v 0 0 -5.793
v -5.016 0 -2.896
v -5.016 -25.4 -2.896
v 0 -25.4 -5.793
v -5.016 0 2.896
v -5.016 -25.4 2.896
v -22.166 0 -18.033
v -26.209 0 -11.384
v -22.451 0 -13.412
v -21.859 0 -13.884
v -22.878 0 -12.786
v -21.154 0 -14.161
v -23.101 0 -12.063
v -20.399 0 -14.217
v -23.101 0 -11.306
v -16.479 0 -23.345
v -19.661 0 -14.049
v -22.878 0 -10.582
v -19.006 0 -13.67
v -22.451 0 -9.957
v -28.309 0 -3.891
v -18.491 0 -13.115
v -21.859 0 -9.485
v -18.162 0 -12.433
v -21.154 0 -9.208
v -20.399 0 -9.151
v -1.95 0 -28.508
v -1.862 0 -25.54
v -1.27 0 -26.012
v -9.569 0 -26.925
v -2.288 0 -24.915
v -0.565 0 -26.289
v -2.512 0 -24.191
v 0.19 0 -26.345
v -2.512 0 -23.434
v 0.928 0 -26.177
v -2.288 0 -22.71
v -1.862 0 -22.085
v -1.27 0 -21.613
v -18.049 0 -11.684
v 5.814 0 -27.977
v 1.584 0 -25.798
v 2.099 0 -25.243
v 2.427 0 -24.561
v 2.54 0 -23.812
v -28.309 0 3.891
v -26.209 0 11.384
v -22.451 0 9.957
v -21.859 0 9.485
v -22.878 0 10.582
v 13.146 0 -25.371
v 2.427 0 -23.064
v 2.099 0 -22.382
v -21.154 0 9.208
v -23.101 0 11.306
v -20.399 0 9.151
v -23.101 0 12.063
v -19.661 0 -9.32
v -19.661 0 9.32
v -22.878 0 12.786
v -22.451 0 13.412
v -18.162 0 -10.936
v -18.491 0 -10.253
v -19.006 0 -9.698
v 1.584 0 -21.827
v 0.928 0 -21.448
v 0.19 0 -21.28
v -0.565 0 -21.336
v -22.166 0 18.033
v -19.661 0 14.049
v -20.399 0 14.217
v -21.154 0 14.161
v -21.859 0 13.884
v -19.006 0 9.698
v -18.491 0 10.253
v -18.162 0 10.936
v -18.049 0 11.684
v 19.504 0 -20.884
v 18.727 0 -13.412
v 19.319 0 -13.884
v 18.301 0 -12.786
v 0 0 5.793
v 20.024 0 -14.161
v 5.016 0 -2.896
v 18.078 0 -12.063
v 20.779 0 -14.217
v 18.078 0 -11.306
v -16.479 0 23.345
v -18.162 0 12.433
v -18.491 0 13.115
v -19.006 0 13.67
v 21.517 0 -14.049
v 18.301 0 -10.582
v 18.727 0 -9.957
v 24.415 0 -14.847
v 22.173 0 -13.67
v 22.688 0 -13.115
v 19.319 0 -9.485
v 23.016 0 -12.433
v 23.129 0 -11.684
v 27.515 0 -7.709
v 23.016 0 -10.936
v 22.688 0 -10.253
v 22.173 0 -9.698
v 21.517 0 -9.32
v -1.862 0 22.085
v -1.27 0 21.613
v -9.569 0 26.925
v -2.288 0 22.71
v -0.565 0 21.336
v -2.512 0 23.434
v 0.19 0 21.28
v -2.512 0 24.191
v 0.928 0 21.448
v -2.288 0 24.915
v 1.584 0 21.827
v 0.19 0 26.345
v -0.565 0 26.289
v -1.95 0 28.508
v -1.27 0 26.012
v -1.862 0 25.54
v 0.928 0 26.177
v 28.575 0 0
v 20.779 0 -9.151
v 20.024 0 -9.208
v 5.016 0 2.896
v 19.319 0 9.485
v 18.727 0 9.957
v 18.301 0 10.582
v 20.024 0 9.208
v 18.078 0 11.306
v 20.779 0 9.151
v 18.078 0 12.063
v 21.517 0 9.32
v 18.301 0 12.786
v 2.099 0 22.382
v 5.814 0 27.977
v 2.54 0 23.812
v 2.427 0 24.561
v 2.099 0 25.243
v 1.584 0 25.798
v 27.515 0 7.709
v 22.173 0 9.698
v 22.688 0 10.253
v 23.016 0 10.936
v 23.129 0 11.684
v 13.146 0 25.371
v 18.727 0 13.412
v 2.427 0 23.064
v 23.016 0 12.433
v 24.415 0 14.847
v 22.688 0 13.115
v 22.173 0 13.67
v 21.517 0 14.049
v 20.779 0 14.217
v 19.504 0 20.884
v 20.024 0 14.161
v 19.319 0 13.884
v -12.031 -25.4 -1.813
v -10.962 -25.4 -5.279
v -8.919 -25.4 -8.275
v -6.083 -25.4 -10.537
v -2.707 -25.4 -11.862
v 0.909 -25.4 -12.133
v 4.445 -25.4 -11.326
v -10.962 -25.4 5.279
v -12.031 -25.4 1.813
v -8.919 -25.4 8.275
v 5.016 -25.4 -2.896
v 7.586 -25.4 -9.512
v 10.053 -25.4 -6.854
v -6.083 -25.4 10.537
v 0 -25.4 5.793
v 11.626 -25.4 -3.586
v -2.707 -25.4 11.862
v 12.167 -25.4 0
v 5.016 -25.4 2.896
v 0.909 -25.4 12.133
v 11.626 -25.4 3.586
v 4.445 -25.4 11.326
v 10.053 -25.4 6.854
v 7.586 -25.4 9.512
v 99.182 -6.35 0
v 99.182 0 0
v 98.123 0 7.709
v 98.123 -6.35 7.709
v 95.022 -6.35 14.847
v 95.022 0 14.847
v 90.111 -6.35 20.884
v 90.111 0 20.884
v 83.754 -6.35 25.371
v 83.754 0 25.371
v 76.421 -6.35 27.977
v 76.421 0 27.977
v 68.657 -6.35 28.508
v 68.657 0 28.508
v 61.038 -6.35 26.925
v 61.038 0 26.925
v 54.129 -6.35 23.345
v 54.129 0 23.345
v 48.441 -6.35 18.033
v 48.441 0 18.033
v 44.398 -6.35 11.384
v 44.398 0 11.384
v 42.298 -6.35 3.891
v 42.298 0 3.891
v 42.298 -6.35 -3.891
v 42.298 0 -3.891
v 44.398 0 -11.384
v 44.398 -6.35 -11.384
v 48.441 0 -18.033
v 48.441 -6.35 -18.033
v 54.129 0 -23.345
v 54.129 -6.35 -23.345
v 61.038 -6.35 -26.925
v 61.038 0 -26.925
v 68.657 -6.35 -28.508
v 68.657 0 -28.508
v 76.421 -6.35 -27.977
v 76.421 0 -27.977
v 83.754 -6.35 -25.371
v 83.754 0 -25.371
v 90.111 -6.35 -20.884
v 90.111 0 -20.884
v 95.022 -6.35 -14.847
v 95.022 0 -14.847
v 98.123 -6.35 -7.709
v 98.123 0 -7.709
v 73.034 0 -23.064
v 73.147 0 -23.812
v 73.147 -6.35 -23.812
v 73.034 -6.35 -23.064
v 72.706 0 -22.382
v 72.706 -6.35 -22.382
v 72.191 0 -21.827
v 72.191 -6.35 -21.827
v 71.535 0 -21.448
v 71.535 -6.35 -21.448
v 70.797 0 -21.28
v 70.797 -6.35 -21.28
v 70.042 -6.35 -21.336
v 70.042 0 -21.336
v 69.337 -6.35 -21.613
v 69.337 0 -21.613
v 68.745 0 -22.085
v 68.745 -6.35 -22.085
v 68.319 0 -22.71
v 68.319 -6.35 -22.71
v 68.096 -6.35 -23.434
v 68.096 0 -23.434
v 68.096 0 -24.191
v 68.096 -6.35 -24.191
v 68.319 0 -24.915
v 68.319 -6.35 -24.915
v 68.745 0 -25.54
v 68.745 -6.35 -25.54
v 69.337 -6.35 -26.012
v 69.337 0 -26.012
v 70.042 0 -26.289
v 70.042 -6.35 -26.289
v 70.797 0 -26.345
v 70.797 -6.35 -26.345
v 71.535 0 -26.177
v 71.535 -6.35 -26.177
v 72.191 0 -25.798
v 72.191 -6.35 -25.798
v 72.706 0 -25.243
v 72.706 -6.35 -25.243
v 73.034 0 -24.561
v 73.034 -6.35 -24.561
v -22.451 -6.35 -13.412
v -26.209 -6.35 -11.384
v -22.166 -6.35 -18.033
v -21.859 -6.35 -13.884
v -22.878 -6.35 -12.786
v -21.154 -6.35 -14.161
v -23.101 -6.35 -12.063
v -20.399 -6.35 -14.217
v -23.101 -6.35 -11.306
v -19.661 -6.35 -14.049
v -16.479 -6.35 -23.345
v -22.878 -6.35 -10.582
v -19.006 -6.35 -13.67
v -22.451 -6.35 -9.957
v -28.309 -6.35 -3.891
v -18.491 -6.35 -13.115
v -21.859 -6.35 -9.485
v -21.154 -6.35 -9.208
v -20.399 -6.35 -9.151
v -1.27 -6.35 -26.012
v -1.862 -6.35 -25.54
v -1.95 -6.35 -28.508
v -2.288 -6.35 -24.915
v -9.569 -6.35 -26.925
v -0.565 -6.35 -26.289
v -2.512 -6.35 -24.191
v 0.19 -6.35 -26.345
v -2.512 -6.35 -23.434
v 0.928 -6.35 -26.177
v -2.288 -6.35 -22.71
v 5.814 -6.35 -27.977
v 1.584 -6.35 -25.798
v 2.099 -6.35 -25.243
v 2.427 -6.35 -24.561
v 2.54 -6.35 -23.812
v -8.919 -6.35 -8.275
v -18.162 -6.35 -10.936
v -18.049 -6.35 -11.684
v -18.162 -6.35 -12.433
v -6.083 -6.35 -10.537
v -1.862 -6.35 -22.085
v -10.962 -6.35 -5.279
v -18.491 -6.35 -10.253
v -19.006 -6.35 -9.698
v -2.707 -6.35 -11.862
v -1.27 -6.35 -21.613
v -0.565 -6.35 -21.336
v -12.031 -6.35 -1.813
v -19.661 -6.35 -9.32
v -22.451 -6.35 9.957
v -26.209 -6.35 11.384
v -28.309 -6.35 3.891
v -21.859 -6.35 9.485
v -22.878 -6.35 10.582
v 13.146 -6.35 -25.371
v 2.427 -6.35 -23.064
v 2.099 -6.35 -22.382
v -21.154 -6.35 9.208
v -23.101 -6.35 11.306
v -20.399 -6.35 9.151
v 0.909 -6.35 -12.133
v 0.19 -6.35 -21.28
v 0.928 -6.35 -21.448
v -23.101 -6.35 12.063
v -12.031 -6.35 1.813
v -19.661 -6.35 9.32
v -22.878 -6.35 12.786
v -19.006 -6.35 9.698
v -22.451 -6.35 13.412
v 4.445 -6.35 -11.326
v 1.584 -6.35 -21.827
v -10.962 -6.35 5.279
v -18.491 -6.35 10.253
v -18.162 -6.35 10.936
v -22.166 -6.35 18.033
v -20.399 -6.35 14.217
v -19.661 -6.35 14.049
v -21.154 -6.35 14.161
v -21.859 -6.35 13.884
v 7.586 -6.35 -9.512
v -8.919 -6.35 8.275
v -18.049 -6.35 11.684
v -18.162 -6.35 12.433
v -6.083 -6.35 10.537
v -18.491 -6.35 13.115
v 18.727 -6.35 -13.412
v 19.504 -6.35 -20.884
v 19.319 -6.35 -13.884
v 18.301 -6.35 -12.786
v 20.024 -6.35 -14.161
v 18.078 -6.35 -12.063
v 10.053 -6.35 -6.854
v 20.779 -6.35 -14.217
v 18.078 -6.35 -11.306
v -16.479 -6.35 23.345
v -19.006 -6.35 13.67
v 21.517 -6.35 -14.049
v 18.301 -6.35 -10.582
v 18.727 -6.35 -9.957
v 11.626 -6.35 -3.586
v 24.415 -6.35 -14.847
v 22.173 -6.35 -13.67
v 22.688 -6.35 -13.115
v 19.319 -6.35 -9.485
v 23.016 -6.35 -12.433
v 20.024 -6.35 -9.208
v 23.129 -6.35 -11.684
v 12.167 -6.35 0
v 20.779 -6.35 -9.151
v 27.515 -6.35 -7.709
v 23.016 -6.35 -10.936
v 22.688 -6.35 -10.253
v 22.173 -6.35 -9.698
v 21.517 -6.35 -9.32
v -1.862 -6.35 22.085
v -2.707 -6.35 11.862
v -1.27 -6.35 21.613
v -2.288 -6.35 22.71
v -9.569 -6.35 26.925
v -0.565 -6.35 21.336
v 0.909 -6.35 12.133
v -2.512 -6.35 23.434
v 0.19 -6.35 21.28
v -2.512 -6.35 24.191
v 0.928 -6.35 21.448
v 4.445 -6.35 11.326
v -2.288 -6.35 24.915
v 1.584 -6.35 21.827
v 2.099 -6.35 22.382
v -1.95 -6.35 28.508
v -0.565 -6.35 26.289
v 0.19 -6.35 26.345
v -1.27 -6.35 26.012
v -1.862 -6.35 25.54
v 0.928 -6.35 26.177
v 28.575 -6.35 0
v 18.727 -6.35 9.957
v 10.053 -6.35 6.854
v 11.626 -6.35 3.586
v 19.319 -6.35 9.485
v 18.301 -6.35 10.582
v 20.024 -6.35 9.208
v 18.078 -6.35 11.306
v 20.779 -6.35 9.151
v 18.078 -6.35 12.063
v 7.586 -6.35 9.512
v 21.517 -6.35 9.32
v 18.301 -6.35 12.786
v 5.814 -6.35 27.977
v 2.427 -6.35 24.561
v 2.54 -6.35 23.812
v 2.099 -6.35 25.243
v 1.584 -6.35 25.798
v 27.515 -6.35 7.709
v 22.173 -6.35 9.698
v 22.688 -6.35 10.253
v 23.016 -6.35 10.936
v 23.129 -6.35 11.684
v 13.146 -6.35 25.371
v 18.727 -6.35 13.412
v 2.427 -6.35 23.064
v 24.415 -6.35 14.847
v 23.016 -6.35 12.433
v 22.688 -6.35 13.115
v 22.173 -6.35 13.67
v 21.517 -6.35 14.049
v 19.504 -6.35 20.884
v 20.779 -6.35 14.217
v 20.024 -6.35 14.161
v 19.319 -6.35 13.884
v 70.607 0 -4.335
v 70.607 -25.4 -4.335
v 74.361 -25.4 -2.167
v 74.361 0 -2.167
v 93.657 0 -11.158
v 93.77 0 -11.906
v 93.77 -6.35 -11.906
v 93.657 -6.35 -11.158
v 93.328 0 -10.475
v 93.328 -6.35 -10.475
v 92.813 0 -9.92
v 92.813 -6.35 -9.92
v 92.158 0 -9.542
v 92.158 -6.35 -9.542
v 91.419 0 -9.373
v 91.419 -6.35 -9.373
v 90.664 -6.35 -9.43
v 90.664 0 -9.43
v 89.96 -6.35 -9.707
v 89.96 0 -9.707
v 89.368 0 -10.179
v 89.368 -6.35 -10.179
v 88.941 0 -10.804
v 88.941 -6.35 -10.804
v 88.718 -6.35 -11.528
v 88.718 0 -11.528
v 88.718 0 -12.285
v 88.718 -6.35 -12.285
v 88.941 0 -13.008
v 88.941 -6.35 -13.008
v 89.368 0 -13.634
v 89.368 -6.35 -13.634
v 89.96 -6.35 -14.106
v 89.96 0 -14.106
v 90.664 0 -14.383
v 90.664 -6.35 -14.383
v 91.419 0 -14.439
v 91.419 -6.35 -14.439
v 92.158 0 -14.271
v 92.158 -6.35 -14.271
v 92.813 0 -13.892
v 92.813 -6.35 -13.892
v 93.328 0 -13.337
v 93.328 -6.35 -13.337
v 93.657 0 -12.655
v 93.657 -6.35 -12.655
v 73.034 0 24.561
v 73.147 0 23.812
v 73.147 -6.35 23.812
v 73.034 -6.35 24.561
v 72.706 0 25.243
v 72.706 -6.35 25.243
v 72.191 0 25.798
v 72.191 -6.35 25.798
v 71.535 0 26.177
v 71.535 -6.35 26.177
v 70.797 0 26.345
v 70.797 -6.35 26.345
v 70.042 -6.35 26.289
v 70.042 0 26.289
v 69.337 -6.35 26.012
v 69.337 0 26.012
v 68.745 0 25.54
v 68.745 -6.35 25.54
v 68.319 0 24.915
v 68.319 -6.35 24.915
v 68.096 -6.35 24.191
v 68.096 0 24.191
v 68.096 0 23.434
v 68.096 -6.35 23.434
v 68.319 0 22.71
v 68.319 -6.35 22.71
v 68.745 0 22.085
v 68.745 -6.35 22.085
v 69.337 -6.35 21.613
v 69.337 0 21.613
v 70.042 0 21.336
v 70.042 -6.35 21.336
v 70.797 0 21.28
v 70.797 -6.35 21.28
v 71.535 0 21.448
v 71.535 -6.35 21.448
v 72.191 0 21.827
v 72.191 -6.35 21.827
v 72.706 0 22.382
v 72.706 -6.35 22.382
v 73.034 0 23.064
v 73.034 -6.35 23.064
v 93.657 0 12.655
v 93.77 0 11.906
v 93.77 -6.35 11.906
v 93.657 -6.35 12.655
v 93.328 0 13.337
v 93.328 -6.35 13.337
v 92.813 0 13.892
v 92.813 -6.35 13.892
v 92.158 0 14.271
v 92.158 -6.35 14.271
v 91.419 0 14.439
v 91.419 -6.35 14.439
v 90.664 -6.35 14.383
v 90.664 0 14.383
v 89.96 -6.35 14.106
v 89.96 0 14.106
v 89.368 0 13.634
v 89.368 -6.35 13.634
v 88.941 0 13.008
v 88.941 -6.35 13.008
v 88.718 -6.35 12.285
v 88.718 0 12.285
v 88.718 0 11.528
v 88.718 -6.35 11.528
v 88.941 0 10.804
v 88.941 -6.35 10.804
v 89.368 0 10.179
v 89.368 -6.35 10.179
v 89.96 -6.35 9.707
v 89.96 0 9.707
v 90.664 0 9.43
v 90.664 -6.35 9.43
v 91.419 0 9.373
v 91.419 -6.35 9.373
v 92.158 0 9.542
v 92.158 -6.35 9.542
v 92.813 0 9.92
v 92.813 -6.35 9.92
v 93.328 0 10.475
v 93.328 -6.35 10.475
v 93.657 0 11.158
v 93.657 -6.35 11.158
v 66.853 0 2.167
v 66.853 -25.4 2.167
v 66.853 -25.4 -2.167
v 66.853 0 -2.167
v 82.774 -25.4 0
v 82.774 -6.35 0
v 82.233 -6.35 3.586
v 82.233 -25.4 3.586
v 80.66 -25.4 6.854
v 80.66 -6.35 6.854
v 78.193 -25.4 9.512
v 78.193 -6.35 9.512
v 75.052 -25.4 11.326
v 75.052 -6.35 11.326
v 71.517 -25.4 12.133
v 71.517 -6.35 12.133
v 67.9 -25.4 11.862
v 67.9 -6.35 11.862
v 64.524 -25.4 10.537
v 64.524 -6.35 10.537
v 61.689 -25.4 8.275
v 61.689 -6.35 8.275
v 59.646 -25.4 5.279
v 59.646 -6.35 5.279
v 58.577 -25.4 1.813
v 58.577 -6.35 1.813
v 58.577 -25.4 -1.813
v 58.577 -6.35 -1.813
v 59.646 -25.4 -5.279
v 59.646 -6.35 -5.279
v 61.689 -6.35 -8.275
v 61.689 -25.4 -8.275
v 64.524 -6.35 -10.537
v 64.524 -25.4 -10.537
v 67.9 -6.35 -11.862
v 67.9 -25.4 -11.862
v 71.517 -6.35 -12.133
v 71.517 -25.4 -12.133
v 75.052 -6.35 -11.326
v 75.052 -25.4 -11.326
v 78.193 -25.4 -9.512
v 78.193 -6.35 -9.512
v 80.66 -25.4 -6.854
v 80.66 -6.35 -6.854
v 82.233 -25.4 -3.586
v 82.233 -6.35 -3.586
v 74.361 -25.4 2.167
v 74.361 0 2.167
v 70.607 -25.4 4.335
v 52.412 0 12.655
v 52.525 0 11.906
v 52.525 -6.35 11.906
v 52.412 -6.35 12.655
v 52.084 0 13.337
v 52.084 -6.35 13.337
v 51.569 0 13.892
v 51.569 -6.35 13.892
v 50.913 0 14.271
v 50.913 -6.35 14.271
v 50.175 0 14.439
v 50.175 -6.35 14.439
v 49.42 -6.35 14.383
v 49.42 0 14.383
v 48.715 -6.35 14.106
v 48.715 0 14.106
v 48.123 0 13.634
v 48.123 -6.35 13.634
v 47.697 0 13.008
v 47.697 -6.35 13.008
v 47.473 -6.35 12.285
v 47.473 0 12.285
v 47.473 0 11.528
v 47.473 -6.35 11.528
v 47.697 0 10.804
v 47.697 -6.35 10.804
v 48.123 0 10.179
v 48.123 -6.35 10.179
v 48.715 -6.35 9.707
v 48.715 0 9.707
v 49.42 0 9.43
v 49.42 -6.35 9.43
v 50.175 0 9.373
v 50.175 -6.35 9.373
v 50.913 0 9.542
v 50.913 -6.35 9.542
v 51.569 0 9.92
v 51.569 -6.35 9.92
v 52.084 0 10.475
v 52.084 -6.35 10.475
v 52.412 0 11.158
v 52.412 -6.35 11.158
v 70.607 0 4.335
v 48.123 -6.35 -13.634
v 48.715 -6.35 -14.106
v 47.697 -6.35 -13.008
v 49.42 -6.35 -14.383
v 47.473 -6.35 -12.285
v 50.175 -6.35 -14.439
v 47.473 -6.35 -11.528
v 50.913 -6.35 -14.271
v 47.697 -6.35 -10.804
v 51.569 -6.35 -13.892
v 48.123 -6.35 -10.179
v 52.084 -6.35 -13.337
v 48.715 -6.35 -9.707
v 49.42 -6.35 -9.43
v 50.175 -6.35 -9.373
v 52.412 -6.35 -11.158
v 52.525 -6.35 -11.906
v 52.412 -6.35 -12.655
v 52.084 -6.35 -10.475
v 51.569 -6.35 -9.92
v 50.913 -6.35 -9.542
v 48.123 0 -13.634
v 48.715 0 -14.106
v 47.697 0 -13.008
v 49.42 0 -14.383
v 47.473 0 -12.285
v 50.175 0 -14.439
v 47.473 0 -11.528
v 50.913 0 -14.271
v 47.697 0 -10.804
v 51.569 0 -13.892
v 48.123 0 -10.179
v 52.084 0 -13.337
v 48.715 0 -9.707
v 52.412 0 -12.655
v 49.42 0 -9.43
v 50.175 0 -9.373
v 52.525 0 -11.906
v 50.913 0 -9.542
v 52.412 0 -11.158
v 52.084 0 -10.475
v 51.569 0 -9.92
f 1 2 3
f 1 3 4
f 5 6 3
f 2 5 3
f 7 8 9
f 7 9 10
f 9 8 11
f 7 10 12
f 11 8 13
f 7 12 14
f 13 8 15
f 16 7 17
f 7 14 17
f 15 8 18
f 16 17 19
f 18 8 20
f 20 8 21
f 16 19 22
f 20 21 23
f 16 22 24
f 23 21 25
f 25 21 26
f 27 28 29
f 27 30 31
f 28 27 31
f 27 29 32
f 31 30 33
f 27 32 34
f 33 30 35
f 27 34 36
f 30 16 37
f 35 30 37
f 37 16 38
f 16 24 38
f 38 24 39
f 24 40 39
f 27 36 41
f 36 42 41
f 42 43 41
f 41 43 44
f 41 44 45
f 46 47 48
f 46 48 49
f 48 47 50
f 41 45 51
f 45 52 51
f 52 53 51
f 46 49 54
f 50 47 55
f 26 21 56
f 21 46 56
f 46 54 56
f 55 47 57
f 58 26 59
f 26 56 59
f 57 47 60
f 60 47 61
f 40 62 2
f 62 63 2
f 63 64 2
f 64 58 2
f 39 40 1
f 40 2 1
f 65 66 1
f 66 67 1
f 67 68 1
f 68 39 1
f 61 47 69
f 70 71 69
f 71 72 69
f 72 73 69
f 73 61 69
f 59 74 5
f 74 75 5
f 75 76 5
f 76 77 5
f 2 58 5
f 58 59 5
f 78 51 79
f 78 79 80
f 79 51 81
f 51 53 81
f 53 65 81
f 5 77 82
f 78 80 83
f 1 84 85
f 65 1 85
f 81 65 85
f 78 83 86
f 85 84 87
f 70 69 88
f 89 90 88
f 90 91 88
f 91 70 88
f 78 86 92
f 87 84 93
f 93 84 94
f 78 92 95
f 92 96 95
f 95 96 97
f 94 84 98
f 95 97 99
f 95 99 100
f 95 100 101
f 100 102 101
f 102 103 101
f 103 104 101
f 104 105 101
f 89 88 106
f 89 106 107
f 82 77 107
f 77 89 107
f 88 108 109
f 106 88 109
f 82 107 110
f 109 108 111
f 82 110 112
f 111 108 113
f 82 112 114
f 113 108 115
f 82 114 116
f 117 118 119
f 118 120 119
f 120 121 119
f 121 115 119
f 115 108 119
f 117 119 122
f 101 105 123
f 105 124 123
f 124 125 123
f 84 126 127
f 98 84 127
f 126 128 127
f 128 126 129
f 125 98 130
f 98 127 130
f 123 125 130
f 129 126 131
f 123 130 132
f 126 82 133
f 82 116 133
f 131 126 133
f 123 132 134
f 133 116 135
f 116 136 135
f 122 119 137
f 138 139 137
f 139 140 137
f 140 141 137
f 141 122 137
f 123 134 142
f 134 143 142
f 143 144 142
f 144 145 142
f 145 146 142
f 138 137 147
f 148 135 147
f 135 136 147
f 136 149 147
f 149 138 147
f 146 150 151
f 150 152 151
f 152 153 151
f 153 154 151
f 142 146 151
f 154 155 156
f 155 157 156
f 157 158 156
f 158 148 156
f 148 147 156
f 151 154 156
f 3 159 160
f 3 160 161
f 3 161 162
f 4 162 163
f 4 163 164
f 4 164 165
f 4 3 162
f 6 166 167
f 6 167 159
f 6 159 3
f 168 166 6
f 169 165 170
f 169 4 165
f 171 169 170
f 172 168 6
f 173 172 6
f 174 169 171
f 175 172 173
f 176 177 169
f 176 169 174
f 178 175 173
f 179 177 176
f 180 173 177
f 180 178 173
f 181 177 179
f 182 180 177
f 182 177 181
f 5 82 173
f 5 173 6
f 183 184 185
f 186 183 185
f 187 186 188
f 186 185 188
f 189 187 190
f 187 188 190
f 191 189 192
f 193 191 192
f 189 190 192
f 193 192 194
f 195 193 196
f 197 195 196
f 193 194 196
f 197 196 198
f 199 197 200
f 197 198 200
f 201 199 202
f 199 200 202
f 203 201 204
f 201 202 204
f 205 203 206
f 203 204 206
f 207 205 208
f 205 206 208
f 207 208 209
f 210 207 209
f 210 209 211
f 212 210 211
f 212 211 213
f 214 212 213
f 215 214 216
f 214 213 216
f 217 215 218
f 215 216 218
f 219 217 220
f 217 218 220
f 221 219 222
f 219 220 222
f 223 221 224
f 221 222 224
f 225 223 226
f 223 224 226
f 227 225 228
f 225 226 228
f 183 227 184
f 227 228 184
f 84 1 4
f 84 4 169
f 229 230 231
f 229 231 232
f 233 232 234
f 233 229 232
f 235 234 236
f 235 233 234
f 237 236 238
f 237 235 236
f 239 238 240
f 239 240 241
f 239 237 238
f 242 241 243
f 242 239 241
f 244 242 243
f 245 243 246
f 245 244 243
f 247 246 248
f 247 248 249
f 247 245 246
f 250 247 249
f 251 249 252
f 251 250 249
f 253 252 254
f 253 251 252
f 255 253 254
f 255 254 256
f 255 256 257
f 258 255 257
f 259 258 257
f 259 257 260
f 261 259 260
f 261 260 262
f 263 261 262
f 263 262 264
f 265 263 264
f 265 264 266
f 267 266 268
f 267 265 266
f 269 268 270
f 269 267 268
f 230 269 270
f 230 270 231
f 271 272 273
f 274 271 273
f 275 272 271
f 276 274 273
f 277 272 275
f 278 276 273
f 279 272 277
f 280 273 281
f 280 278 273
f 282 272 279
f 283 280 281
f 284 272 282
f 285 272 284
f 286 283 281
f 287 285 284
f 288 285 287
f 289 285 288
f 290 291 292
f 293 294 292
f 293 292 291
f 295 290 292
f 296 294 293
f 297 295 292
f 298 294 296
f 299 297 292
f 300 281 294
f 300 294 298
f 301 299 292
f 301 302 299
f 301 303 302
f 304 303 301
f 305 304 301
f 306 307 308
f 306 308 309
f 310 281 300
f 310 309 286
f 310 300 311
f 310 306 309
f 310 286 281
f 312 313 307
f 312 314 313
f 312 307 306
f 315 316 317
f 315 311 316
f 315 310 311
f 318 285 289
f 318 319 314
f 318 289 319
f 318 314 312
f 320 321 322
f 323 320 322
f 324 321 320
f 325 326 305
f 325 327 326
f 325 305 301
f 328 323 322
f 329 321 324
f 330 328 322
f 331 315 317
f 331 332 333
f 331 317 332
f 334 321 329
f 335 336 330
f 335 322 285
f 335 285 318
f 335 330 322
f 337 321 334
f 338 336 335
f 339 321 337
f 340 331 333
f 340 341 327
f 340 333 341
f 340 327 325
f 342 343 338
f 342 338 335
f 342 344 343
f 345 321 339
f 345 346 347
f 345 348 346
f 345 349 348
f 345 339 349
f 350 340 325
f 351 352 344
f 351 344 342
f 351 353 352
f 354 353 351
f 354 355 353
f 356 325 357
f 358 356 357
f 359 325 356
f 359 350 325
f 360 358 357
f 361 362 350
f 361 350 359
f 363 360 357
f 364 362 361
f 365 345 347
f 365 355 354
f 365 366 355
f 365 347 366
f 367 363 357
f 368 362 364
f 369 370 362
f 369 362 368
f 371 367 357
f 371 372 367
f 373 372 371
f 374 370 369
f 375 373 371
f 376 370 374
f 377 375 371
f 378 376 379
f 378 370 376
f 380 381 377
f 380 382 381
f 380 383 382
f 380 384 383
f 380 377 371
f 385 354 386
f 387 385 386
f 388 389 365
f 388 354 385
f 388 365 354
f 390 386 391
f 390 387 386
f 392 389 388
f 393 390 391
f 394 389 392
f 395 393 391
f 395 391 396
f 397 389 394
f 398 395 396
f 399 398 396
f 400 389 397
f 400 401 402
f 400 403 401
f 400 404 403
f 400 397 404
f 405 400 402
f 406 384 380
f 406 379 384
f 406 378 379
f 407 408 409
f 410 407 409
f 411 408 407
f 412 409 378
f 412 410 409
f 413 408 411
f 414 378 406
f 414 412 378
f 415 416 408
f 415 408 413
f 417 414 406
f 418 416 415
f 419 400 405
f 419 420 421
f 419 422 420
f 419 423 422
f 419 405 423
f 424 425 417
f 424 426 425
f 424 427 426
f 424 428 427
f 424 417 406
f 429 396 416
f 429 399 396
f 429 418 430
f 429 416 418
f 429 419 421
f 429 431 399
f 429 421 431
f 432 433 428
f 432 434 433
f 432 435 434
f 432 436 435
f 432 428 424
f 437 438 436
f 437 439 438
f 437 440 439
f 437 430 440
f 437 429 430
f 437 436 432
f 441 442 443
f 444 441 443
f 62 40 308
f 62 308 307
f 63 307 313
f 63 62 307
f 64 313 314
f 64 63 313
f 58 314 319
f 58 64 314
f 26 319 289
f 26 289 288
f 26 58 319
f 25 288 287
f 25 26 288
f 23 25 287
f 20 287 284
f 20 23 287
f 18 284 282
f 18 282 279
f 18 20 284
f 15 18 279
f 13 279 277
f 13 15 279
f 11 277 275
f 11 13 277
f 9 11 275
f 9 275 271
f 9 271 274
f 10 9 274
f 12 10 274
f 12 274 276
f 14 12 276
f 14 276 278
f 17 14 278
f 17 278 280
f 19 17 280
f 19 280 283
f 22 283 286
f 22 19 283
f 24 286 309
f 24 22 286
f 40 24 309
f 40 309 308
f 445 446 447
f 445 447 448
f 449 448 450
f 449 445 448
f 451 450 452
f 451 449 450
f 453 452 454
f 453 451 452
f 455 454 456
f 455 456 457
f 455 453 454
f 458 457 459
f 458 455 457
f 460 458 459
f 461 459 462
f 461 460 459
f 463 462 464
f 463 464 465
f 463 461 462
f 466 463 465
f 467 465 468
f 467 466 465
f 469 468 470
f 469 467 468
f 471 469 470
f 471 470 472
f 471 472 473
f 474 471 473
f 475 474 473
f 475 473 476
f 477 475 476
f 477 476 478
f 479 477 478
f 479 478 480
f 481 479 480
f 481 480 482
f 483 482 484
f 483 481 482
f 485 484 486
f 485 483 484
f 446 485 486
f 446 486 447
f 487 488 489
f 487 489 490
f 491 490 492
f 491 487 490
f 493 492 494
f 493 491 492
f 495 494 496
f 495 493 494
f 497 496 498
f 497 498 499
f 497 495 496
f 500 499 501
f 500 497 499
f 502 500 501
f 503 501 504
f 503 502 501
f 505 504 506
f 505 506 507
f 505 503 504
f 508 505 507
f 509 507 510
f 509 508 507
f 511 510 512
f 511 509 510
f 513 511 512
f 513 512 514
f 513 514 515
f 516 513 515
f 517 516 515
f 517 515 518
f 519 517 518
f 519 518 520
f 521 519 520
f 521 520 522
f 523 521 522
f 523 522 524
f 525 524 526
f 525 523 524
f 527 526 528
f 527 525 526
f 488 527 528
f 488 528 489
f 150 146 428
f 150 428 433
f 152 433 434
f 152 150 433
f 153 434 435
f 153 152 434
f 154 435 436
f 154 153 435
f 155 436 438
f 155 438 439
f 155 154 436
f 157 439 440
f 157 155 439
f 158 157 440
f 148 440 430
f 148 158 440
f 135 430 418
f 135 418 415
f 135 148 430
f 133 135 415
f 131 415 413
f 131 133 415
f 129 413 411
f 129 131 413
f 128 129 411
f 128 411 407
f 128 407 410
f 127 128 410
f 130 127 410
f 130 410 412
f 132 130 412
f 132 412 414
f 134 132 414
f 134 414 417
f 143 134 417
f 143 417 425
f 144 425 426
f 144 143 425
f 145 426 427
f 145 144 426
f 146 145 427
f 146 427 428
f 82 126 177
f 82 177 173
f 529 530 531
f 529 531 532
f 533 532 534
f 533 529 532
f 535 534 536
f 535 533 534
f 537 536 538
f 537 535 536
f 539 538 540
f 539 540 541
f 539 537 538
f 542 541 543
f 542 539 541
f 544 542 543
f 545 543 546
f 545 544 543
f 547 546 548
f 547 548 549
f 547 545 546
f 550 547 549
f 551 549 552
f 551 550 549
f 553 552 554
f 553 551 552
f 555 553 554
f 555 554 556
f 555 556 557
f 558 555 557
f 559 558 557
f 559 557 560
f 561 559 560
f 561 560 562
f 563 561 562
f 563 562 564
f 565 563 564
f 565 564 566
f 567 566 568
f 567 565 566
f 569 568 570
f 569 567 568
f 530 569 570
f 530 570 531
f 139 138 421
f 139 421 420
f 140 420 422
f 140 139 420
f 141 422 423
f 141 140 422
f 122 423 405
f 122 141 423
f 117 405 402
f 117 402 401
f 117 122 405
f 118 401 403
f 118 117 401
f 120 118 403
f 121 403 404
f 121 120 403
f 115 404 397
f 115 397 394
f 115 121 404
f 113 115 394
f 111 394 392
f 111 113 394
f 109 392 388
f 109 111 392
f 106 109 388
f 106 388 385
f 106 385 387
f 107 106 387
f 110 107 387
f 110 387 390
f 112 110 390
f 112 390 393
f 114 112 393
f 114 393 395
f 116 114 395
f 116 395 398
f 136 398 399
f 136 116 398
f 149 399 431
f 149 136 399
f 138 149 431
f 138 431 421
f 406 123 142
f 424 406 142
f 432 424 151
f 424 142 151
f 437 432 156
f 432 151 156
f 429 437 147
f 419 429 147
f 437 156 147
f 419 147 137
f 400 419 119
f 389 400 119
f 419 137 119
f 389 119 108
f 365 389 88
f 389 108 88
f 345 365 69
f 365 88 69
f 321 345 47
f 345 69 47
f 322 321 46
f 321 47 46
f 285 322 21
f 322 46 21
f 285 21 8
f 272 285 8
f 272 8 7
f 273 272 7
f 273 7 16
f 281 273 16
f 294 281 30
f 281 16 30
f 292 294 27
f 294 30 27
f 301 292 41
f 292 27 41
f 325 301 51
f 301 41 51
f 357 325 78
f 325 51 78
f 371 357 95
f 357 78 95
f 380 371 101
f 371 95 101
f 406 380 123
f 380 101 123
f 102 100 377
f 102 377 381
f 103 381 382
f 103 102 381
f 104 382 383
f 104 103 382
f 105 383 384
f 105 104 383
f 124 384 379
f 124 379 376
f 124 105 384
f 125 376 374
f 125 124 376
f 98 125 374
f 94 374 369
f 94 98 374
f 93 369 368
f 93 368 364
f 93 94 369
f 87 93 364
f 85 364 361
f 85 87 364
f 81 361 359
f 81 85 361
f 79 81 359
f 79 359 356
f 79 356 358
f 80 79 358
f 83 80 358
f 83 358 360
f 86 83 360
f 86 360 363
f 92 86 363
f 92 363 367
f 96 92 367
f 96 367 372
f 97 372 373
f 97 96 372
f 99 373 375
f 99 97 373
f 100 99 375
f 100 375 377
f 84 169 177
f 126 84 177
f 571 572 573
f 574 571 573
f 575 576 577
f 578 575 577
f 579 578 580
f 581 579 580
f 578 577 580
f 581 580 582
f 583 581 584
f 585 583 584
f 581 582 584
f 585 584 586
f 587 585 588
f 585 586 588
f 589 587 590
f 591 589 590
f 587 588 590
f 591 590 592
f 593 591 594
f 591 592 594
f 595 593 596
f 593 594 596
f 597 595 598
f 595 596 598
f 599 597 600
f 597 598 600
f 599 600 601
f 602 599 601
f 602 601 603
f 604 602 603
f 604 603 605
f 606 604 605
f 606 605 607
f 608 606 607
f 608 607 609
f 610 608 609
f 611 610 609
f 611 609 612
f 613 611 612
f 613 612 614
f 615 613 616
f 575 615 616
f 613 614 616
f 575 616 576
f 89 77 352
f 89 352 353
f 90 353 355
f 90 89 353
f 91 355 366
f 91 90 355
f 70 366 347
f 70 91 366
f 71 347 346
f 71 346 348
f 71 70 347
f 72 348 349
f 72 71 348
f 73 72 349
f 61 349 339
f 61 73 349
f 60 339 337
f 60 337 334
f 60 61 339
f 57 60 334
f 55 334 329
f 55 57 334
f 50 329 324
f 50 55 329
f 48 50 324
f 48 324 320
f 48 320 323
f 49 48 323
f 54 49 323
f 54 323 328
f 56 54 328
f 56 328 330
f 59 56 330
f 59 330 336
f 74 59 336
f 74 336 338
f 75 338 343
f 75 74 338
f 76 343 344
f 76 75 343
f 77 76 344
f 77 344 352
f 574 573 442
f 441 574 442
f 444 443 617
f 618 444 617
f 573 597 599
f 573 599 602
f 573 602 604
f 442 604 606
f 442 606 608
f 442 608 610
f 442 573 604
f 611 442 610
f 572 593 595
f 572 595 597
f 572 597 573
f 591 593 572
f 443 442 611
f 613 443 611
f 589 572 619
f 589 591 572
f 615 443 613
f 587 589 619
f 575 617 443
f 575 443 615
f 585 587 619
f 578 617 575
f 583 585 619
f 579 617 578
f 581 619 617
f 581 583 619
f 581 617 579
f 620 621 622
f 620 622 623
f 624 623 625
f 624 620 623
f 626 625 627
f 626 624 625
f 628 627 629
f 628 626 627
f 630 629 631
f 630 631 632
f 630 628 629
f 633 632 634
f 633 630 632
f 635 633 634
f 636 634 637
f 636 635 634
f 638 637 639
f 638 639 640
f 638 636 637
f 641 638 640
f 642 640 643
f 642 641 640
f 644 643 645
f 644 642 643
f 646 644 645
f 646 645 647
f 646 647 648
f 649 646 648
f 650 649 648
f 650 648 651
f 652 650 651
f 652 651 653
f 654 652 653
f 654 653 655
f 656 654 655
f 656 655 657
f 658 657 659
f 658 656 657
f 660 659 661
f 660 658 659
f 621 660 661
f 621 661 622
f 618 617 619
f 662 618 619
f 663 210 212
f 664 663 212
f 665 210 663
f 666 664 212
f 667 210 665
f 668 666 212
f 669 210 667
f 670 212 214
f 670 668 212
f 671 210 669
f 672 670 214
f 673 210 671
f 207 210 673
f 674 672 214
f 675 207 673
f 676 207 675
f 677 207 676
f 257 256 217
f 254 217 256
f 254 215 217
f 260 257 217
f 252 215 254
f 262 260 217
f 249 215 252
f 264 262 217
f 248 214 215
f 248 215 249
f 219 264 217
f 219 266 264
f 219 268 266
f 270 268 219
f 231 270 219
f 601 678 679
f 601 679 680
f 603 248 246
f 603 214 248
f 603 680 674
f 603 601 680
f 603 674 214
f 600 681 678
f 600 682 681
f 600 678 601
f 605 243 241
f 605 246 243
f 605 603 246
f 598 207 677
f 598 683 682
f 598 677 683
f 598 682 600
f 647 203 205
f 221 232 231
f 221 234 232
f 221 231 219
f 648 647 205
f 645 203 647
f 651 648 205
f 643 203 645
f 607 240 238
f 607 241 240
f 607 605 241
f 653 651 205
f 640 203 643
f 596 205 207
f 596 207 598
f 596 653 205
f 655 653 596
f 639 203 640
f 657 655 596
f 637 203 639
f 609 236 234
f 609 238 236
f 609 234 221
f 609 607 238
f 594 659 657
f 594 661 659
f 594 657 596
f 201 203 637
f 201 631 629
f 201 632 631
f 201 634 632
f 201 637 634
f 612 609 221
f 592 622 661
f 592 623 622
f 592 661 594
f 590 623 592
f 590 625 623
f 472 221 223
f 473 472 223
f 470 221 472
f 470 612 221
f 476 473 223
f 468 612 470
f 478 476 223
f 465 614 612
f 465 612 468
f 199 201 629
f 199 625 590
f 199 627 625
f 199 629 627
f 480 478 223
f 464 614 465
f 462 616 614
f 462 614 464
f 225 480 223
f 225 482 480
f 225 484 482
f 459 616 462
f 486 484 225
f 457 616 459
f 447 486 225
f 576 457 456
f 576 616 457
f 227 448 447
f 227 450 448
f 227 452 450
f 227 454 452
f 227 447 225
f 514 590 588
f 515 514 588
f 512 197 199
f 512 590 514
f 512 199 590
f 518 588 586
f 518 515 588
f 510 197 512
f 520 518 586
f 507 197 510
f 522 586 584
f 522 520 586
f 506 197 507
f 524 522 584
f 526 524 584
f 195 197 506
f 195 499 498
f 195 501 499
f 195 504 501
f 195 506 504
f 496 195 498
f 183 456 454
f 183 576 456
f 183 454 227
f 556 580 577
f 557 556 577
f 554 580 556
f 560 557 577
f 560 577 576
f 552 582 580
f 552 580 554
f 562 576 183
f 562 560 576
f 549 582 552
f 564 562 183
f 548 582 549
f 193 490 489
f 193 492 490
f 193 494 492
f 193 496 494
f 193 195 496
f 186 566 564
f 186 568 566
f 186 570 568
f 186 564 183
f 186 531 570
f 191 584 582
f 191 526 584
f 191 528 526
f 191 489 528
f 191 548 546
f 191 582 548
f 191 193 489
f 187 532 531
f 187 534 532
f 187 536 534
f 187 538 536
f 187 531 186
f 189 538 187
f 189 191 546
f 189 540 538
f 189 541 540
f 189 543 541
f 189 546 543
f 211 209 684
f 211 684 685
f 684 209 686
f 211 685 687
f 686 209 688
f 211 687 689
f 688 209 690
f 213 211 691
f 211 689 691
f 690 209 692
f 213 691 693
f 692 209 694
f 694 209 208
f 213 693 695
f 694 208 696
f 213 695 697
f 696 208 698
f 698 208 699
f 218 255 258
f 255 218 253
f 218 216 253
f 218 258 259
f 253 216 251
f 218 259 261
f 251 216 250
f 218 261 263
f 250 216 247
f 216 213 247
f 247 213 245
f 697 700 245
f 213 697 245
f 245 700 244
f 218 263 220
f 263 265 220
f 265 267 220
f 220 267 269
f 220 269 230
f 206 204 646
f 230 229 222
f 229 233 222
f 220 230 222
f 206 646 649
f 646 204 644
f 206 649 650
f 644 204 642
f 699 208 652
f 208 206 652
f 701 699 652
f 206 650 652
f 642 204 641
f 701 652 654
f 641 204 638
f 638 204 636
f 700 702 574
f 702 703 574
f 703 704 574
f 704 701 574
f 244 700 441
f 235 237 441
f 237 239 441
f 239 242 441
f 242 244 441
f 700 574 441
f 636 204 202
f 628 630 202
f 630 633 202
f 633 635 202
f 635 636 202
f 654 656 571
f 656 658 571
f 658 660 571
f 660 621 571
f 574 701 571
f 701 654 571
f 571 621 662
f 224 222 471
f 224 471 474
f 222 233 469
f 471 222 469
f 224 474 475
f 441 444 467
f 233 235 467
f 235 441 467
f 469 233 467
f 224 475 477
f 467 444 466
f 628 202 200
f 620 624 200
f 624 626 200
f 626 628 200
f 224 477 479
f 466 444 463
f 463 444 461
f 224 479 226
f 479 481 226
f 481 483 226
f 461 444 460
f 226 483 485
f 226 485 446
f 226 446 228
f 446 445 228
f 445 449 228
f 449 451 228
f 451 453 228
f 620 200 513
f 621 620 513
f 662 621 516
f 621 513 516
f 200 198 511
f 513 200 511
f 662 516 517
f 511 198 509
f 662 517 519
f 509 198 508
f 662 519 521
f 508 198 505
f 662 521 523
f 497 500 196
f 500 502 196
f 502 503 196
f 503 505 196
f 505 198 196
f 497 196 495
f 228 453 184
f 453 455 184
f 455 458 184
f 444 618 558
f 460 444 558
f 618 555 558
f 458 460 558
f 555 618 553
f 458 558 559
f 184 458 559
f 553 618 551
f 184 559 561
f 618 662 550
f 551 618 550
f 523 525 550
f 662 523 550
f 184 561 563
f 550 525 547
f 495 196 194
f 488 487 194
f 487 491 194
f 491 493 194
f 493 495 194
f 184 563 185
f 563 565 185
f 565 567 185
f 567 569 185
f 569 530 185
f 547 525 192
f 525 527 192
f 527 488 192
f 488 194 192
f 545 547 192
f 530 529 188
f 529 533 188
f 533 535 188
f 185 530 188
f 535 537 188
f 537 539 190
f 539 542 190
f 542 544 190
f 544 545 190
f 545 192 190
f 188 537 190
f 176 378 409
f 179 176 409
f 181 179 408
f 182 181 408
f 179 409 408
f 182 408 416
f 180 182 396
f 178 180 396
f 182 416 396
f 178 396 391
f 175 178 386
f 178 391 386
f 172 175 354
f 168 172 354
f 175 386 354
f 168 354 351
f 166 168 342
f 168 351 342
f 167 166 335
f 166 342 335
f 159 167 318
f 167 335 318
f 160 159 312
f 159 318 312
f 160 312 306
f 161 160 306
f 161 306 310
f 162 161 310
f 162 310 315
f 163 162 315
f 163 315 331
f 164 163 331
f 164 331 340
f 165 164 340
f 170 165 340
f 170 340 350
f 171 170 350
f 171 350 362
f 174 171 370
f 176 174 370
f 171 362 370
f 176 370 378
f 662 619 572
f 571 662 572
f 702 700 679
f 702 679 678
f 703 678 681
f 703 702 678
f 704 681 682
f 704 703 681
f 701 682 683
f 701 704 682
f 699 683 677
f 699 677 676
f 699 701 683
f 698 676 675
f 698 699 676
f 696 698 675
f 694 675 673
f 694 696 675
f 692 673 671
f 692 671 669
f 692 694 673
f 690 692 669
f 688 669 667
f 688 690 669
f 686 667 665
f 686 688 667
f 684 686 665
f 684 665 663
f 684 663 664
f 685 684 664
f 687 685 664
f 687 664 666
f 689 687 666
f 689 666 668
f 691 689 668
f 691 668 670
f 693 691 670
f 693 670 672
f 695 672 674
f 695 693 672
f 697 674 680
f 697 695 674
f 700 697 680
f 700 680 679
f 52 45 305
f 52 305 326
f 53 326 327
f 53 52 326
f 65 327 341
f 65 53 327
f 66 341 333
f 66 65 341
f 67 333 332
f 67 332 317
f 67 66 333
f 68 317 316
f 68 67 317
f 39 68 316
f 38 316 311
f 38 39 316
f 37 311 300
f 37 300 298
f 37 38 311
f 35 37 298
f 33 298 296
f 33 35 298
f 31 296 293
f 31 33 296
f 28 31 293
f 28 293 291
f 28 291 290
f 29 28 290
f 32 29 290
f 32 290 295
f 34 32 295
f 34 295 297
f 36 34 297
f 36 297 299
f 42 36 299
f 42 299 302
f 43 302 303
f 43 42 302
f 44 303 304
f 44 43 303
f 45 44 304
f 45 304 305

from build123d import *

# Parameters (mm, degrees)
F0_R     = 28.575
F0_R_2   = 2.54
F1_DEPTH = 6.35
F2_R     = 12.1666
F3_DEPTH = 19.05
F5_DEPTH = 25.401
F6_DEPTH = 25.401


with BuildPart() as f1:
    # F0 (on Front) → F1 (new body)
    with BuildSketch(Plane.XZ):
        Circle(F0_R)
        with Locations((0, -23.8125)):
            Circle(F0_R_2, mode=Mode.SUBTRACT)
        with Locations((-20.589199, -11.684256)):
            Circle(F0_R_2, mode=Mode.SUBTRACT)
        with Locations((20.589199, -11.684256)):
            Circle(F0_R_2, mode=Mode.SUBTRACT)
        with Locations((-20.589199, 11.684256)):
            Circle(F0_R_2, mode=Mode.SUBTRACT)
        with Locations((20.589199, 11.684256)):
            Circle(F0_R_2, mode=Mode.SUBTRACT)
        with Locations((0, 23.8125)):
            Circle(F0_R_2, mode=Mode.SUBTRACT)
        with Locations((70.607326, 0)):
            Circle(F0_R)
        with Locations((70.607326, -23.8125)):
            Circle(F0_R_2, mode=Mode.SUBTRACT)
        with Locations((49.985096, -11.90625)):
            Circle(F0_R_2, mode=Mode.SUBTRACT)
        with Locations((91.229556, -11.90625)):
            Circle(F0_R_2, mode=Mode.SUBTRACT)
        with Locations((49.985096, 11.90625)):
            Circle(F0_R_2, mode=Mode.SUBTRACT)
        with Locations((91.229556, 11.90625)):
            Circle(F0_R_2, mode=Mode.SUBTRACT)
        with Locations((70.607326, 23.8125)):
            Circle(F0_R_2, mode=Mode.SUBTRACT)
    extrude(amount=F1_DEPTH)

    # F2 (on face) → F3 (join)
    with BuildSketch(Plane.XZ.offset(6.35)):
        Circle(F2_R)
        with Locations((70.607326, 0)):
            Circle(F2_R)
    extrude(amount=F3_DEPTH)

    # F4 (on face) → F5 (cut, through all)
    with BuildSketch(Plane.XZ.offset(25.4)):
        Polygon((0, 5.792555), (-5.0165, 2.896278), (-5.0165, -2.896278), (0, -5.792555), (5.0165, -2.896278), (5.0165, 2.896278), align=None)
        Polygon((74.361326, 2.167373), (70.607326, 4.334746), (66.853326, 2.167373), (66.853326, -2.167373), (70.607326, -4.334746), (74.361326, -2.167373), align=None)
    extrude(amount=-F5_DEPTH, mode=Mode.SUBTRACT)

    # F4 (on face) → F6 (cut, through all)
    with BuildSketch(Plane.XZ.offset(25.4)):
        Polygon((74.361326, 2.167373), (70.607326, 4.334746), (66.853326, 2.167373), (66.853326, -2.167373), (70.607326, -4.334746), (74.361326, -2.167373), align=None)
    extrude(amount=-F6_DEPTH, mode=Mode.SUBTRACT)


solid = f1.part
